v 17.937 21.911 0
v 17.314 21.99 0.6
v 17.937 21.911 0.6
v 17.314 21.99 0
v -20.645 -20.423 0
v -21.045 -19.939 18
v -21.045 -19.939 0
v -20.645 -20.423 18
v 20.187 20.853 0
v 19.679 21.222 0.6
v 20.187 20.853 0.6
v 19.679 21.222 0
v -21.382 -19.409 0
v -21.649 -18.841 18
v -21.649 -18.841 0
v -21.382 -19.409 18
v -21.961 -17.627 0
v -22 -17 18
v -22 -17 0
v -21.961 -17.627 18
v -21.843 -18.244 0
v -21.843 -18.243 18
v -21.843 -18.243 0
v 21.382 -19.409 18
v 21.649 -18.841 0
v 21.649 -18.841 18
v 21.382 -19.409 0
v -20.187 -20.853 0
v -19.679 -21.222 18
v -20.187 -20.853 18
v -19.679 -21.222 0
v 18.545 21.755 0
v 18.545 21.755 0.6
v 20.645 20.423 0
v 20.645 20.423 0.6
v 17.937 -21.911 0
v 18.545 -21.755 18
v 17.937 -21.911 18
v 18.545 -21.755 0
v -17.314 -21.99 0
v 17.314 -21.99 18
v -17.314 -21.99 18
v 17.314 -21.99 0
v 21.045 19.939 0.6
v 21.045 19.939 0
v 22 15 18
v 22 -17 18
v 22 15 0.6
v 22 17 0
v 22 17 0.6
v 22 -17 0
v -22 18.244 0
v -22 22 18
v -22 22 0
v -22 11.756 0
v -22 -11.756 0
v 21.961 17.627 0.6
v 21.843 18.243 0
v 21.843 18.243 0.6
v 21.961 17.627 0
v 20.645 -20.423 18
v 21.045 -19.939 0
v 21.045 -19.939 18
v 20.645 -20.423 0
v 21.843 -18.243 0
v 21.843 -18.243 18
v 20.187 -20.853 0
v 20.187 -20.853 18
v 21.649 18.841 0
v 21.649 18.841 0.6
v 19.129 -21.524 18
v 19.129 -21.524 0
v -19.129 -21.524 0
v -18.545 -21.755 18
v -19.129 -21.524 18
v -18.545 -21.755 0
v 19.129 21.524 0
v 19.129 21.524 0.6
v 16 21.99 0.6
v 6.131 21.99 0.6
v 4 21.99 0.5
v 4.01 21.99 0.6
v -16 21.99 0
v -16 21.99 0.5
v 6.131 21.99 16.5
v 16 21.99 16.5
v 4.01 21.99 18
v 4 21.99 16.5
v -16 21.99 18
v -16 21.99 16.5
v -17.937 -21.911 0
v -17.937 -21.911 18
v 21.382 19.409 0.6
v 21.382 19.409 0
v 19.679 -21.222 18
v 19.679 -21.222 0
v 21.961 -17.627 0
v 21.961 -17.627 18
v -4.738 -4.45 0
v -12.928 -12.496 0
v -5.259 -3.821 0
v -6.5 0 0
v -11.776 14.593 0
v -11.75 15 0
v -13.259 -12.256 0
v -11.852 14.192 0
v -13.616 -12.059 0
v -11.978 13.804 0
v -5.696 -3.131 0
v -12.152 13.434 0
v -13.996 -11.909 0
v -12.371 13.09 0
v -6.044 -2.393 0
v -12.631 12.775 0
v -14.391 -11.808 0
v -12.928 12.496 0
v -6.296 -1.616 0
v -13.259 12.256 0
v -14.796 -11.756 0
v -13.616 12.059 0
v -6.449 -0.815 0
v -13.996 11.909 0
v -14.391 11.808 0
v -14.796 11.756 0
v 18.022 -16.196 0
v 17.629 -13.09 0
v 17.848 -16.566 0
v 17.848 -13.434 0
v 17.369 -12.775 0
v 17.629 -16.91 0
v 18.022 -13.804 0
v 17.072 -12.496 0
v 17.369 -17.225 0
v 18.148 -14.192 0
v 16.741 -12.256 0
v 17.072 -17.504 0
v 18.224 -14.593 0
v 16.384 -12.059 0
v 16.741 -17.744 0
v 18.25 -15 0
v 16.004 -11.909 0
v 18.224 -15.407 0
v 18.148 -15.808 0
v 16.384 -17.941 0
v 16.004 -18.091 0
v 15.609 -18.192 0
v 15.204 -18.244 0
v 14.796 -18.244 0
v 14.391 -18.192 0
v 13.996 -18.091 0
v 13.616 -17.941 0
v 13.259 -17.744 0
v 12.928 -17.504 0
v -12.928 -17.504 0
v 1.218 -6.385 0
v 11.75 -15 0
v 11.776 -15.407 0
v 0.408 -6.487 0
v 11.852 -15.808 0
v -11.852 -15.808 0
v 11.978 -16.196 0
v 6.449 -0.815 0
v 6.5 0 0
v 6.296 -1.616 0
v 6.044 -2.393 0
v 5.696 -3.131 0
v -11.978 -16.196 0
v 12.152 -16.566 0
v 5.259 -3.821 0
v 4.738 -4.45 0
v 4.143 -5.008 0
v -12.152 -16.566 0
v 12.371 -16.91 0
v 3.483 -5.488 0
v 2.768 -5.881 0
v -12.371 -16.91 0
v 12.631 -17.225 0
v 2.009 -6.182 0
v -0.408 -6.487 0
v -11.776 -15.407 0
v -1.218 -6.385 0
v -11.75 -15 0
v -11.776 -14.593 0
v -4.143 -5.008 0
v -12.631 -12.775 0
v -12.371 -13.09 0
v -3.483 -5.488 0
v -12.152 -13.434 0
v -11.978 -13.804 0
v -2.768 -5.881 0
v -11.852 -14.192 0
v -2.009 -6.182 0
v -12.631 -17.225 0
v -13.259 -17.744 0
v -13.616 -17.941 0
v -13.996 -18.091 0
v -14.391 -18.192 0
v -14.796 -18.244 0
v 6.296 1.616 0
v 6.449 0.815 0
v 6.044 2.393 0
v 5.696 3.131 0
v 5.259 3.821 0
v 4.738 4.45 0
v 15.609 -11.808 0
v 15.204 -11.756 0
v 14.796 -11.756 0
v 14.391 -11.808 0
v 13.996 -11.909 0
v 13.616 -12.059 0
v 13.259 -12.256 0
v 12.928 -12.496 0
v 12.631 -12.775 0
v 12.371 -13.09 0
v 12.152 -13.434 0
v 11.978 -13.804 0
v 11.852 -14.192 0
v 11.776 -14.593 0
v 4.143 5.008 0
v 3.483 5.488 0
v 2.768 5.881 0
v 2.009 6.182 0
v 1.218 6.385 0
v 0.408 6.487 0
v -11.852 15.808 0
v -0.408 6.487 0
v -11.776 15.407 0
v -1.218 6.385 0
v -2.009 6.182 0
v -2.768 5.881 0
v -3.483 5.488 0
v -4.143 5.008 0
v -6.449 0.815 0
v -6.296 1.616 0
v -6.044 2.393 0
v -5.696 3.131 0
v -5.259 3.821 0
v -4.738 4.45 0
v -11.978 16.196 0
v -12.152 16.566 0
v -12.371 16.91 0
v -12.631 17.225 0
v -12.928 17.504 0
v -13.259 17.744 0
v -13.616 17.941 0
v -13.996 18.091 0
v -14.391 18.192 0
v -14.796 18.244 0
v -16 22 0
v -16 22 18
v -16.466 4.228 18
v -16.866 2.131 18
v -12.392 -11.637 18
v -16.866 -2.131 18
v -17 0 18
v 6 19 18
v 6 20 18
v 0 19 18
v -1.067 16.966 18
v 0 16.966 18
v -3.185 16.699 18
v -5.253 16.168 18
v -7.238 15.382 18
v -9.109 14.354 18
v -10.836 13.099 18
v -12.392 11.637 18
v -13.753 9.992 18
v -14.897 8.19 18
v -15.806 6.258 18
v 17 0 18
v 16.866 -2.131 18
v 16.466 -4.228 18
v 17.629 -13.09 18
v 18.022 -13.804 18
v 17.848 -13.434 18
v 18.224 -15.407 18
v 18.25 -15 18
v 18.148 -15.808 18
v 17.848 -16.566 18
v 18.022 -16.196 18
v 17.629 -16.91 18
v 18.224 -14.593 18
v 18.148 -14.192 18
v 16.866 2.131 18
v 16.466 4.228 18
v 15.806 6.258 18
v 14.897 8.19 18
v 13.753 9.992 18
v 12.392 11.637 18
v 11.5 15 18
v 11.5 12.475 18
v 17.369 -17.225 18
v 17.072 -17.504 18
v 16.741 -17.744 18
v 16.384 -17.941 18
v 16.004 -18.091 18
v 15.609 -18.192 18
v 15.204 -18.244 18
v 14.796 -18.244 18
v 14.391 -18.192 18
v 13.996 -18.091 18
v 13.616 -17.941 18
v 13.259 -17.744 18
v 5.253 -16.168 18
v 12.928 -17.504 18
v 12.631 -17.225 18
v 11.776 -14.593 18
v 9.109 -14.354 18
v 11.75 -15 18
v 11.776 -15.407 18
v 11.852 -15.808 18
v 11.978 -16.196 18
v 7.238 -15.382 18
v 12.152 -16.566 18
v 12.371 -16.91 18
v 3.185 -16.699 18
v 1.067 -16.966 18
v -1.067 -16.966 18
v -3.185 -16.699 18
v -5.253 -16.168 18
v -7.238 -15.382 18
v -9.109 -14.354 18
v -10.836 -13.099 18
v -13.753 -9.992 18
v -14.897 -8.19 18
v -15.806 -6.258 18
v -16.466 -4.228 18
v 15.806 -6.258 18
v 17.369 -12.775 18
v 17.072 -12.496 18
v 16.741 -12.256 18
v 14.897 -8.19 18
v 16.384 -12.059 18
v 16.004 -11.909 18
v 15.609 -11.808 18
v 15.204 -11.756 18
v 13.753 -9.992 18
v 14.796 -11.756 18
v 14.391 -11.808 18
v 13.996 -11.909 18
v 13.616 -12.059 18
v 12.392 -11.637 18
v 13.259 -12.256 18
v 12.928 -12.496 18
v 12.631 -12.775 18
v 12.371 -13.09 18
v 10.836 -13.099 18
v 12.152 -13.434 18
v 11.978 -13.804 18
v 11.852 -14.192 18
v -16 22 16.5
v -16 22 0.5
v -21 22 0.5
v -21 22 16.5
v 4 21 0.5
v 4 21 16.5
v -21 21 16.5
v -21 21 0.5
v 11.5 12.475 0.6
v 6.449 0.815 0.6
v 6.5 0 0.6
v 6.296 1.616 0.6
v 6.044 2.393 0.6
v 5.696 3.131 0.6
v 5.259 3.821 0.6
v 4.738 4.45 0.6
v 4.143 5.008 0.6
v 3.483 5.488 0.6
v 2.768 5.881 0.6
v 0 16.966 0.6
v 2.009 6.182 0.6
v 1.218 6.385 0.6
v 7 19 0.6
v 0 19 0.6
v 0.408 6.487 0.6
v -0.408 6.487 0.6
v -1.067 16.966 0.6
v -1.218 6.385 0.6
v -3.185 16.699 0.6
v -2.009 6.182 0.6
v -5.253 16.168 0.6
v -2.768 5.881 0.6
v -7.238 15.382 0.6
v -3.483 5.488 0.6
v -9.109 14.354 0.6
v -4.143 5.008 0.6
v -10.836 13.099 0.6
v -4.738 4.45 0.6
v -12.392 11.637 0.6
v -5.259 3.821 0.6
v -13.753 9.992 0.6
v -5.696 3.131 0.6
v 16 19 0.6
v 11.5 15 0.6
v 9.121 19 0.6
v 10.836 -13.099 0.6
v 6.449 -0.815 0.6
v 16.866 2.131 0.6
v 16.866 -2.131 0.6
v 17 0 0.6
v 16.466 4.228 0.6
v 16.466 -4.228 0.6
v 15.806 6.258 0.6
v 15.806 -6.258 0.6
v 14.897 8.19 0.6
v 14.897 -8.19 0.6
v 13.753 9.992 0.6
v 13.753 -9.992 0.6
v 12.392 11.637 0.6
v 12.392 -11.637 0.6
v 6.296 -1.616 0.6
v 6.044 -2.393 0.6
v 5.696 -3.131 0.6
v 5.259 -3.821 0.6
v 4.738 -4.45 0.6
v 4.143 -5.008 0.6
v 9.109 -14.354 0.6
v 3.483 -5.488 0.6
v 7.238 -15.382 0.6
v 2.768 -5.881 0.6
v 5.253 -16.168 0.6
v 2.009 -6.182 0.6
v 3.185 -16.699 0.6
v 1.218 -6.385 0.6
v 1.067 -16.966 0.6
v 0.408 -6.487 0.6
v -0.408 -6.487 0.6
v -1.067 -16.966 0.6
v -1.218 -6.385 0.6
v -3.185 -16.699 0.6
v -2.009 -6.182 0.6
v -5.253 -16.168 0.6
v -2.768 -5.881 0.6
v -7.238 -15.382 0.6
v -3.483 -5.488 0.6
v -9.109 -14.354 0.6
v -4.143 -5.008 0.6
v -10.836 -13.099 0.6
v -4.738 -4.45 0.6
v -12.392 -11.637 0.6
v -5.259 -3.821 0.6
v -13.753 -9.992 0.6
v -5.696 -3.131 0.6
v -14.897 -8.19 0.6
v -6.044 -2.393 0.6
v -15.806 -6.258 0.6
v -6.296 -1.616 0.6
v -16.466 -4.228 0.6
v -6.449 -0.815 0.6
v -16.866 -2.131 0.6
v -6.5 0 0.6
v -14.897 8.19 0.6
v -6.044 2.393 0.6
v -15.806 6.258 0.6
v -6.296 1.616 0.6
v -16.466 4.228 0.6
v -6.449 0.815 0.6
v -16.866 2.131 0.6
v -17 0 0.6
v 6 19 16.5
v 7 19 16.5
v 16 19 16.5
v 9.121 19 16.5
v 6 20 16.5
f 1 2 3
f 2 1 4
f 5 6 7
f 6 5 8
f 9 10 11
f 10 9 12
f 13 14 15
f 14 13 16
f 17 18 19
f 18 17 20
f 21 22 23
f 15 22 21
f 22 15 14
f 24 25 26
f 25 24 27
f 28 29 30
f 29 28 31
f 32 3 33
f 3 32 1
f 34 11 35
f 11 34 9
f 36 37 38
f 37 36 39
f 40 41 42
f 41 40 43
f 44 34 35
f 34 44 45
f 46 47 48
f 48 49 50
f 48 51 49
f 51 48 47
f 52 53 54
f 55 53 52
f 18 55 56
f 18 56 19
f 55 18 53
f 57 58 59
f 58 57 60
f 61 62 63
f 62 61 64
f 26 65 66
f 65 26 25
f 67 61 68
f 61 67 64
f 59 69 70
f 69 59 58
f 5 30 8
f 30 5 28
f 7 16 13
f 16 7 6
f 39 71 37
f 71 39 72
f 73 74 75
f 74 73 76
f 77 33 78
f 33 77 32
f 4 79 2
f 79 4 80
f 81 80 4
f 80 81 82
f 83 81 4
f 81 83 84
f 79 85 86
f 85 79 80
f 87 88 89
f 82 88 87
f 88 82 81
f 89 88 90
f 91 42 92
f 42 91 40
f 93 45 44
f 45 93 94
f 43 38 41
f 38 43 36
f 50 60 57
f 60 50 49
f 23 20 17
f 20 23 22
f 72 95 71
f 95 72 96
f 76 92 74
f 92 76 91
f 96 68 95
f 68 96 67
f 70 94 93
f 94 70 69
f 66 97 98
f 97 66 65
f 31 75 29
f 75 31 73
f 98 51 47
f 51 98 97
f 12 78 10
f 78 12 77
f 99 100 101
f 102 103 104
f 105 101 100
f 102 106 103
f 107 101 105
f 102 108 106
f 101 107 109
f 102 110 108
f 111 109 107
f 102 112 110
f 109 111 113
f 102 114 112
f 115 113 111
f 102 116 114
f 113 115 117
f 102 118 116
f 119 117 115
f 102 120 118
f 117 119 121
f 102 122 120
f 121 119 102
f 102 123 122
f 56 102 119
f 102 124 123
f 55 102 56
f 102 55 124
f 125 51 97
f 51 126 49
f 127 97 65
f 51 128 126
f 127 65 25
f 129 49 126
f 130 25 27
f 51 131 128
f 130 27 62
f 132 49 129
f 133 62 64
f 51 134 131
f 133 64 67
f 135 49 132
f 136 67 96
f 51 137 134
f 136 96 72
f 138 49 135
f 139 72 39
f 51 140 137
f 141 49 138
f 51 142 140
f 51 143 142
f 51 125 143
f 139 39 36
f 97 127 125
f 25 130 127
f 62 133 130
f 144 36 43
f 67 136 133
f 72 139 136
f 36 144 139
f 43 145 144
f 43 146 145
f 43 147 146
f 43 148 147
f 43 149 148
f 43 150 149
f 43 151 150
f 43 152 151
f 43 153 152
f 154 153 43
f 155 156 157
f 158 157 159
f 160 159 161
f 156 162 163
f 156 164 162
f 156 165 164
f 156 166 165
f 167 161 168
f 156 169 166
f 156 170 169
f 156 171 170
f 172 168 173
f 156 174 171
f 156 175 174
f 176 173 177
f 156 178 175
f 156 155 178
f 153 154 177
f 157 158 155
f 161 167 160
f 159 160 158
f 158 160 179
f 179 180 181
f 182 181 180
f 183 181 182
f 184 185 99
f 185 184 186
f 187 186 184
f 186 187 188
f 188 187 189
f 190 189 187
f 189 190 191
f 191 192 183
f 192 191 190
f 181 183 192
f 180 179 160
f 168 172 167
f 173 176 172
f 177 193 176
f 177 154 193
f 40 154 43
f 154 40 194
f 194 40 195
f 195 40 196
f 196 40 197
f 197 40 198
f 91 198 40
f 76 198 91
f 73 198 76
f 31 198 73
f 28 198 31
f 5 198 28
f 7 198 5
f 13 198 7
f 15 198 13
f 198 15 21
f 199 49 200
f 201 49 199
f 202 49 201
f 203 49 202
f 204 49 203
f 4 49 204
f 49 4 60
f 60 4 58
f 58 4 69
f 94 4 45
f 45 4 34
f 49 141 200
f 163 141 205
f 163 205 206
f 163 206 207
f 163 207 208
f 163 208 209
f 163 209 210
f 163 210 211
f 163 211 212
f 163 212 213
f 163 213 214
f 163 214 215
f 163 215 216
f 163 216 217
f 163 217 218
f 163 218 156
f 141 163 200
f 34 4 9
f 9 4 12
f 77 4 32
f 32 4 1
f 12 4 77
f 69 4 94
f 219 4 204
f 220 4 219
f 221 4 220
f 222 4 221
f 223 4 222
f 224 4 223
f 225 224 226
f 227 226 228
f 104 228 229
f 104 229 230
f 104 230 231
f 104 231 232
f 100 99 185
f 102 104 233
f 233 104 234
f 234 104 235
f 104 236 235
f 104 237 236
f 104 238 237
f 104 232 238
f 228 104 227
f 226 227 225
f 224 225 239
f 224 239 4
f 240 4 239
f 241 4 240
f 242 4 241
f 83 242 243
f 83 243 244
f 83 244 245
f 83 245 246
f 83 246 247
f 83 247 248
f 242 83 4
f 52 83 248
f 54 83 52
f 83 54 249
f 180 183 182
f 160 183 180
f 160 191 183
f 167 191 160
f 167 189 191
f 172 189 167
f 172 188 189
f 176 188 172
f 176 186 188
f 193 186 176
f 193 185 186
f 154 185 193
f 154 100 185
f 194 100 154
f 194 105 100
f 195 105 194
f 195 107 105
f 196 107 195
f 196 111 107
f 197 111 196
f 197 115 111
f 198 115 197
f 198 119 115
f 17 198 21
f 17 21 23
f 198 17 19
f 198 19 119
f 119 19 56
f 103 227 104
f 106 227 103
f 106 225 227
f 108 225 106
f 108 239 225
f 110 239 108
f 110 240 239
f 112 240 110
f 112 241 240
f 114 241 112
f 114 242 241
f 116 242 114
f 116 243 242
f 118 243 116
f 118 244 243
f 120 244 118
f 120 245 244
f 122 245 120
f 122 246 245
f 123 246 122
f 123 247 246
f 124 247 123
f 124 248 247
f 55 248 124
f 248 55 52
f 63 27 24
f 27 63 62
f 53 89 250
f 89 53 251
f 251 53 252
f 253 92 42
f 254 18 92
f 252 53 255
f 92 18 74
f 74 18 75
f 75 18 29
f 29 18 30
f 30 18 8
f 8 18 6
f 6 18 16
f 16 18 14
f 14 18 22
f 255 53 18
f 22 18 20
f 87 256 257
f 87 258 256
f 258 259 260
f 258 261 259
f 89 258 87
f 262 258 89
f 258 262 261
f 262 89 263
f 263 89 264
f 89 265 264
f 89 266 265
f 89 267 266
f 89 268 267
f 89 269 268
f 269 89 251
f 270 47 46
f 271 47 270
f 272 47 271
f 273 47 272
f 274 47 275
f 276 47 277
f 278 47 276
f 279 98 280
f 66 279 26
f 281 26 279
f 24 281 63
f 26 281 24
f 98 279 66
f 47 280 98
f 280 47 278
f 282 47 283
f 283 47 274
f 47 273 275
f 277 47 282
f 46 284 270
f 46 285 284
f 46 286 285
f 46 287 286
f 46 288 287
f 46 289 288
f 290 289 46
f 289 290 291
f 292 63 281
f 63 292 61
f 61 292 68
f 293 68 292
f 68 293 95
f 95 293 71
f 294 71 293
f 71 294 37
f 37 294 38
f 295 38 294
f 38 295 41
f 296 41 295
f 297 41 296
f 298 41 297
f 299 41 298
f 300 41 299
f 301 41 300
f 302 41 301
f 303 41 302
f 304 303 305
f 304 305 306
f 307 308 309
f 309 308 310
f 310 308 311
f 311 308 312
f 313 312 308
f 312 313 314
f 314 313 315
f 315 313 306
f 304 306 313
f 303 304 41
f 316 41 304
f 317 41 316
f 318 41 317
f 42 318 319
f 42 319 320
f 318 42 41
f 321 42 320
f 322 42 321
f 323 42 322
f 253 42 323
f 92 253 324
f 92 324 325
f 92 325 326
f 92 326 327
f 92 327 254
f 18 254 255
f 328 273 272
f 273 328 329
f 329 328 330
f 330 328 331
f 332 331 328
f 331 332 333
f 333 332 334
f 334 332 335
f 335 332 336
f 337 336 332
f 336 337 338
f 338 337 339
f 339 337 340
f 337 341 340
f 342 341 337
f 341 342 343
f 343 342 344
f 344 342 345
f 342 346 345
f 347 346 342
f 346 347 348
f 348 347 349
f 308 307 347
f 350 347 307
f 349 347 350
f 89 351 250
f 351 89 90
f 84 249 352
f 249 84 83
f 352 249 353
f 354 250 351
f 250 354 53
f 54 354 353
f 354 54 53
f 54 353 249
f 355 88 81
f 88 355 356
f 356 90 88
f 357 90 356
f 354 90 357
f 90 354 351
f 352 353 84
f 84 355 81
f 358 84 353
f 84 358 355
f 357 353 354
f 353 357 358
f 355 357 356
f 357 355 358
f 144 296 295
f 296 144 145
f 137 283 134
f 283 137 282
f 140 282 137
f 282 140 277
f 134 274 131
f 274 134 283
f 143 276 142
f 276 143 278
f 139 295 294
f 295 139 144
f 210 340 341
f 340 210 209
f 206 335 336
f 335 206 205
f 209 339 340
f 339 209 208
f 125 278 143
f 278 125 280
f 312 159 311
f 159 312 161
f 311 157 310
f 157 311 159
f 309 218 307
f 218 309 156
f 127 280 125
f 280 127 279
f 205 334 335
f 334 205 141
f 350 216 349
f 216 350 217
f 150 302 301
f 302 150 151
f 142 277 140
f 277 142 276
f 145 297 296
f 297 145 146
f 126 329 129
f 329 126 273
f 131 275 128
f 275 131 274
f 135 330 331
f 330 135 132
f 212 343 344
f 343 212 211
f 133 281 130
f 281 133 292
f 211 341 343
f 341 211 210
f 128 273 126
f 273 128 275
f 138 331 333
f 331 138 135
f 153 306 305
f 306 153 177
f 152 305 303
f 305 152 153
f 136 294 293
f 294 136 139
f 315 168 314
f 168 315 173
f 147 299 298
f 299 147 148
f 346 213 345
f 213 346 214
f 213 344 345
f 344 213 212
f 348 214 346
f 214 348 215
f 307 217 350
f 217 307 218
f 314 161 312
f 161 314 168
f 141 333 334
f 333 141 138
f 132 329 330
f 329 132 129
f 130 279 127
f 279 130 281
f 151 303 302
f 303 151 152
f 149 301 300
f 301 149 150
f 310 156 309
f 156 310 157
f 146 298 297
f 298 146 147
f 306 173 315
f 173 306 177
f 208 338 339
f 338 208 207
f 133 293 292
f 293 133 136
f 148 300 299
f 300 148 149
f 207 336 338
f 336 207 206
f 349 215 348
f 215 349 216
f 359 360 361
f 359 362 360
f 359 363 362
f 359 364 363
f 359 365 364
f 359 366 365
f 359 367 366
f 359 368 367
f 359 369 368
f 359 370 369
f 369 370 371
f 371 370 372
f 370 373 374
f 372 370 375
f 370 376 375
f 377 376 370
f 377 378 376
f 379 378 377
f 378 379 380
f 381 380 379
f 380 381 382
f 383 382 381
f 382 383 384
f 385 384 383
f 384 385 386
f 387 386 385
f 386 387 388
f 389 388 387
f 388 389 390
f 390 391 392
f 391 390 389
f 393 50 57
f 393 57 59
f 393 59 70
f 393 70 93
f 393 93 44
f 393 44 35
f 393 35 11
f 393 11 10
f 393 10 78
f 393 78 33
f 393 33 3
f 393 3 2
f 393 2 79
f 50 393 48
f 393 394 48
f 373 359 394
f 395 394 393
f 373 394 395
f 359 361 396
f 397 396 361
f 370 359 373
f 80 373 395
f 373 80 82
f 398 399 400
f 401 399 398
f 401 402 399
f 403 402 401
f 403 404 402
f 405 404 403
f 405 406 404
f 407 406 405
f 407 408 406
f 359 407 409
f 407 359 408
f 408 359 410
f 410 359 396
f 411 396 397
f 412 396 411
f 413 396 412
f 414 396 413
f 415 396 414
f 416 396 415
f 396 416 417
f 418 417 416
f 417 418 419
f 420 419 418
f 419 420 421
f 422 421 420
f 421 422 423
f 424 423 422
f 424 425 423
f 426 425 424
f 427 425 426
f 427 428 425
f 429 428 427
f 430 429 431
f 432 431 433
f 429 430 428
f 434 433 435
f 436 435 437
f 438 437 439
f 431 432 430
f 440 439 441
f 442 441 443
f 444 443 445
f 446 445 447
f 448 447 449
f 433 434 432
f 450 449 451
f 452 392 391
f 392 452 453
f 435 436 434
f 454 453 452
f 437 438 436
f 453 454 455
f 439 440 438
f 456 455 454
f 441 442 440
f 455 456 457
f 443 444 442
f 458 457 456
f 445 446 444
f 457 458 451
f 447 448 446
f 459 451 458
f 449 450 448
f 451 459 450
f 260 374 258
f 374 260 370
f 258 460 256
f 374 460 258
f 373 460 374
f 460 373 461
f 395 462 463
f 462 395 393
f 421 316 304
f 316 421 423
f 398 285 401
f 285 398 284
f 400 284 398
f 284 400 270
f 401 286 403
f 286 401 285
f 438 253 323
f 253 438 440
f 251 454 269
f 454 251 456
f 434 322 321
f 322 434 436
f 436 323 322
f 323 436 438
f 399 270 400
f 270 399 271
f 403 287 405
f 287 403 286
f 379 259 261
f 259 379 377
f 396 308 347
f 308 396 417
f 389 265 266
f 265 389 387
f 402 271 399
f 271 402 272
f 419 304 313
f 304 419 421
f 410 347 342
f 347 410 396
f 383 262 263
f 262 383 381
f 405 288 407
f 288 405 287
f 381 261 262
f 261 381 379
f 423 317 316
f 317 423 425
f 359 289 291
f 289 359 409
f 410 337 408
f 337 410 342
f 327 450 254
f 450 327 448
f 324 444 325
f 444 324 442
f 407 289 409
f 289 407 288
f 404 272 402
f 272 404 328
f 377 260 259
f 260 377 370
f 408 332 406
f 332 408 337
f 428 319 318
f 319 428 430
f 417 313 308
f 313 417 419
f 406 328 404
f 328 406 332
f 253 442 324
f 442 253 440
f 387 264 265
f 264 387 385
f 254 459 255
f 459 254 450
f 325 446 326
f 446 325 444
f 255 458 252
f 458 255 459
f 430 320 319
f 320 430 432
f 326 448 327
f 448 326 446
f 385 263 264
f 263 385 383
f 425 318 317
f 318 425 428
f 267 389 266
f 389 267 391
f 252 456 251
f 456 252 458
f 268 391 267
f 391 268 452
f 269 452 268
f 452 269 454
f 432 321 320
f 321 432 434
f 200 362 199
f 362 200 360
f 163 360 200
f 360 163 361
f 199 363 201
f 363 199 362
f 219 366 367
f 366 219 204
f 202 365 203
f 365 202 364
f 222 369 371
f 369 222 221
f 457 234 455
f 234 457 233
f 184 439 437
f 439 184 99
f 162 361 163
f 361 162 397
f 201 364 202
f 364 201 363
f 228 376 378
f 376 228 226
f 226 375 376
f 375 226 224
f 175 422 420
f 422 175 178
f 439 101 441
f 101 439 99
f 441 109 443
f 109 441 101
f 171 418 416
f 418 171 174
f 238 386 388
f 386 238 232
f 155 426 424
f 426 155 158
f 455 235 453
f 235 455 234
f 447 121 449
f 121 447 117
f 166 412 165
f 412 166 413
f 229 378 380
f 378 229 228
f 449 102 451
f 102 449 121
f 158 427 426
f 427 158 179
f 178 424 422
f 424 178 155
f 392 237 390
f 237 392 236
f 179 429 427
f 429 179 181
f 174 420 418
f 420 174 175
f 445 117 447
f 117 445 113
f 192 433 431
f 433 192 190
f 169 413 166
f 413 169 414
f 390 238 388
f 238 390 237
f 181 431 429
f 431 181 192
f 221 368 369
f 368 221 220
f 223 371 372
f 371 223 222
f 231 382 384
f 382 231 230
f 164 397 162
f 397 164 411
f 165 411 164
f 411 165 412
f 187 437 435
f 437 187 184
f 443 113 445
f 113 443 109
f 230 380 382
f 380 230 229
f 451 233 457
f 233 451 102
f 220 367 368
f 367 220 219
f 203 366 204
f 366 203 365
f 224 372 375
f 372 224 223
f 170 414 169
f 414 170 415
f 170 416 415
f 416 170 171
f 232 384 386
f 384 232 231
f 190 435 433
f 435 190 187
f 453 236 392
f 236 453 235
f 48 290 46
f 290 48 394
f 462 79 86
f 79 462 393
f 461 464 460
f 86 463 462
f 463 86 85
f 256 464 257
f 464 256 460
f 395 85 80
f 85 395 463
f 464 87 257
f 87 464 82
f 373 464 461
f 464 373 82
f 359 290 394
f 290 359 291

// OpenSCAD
$fn = 50;


difference() {
	union() {
		hull() {
			translate(v = [-17.0000000000, 17.0000000000, 0]) {
				cylinder(h = 18, r = 5);
			}
			translate(v = [17.0000000000, 17.0000000000, 0]) {
				cylinder(h = 18, r = 5);
			}
			translate(v = [-17.0000000000, -17.0000000000, 0]) {
				cylinder(h = 18, r = 5);
			}
			translate(v = [17.0000000000, -17.0000000000, 0]) {
				cylinder(h = 18, r = 5);
			}
		}
		translate(v = [-22.0000000000, 16.0000000000, 0]) {
			cube(size = [6, 6, 18]);
		}
	}
	union() {
		translate(v = [-22.5000000000, -15.0000000000, -250.0000000000]) {
			rotate(a = [0, 0, 0]) {
				difference() {
					union() {
						hull() {
							translate(v = [7.5000000000, 0, 0]) {
								cylinder(h = 250, r = 3.2500000000, r1 = 3.2500000000, r2 = 3.2500000000);
							}
							translate(v = [-7.5000000000, 0, 0]) {
								cylinder(h = 250, r = 3.2500000000, r1 = 3.2500000000, r2 = 3.2500000000);
							}
						}
					}
					union();
				}
			}
		}
		translate(v = [-22.5000000000, 15.0000000000, -250.0000000000]) {
			rotate(a = [0, 0, 0]) {
				difference() {
					union() {
						hull() {
							translate(v = [7.5000000000, 0, 0]) {
								cylinder(h = 250, r = 3.2500000000, r1 = 3.2500000000, r2 = 3.2500000000);
							}
							translate(v = [-7.5000000000, 0, 0]) {
								cylinder(h = 250, r = 3.2500000000, r1 = 3.2500000000, r2 = 3.2500000000);
							}
						}
					}
					union();
				}
			}
		}
		translate(v = [-21.0000000000, 21.0000000000, 0.5000000000]) {
			cube(size = [25, 1, 16]);
		}
		translate(v = [15.0000000000, -15.0000000000, -50.0000000000]) {
			cylinder(h = 100, r = 3.2500000000);
		}
		translate(v = [0.0000000000, 11.0000000000, 0.6000000000]) {
			cube(size = [11, 8, 20.4000000000]);
		}
		translate(v = [0, 0, 0.6000000000]) {
			cylinder(h = 20.4000000000, r = 17.0000000000);
		}
		translate(v = [0, 0, -9.0000000000]) {
			cylinder(h = 18, r = 6.5000000000);
		}
		translate(v = [0.0000000000, 15.0000000000, 0.6000000000]) {
			cube(size = [22.0000000000, 4, 20.4000000000]);
		}
		translate(v = [16.0000000000, 15.0000000000, 0.6000000000]) {
			cube(size = [6, 7, 20.4000000000]);
		}
		translate(v = [6.0000000000, 15.0000000000, 16.5000000000]) {
			cube(size = [16, 7, 1.5000000000]);
		}
		translate(v = [3.2500000000, 22.7500000000, 0.6000000000]) {
			rotate(a = [0, 0, -45]) {
				cube(size = [7.5000000000, 1.5000000000, 20.4000000000]);
			}
		}
		translate(v = [2.5000000000, 10.0000000000, 0.6000000000]) {
			cube(size = [9.0000000000, 5, 17.4000000000]);
		}
	}
}
